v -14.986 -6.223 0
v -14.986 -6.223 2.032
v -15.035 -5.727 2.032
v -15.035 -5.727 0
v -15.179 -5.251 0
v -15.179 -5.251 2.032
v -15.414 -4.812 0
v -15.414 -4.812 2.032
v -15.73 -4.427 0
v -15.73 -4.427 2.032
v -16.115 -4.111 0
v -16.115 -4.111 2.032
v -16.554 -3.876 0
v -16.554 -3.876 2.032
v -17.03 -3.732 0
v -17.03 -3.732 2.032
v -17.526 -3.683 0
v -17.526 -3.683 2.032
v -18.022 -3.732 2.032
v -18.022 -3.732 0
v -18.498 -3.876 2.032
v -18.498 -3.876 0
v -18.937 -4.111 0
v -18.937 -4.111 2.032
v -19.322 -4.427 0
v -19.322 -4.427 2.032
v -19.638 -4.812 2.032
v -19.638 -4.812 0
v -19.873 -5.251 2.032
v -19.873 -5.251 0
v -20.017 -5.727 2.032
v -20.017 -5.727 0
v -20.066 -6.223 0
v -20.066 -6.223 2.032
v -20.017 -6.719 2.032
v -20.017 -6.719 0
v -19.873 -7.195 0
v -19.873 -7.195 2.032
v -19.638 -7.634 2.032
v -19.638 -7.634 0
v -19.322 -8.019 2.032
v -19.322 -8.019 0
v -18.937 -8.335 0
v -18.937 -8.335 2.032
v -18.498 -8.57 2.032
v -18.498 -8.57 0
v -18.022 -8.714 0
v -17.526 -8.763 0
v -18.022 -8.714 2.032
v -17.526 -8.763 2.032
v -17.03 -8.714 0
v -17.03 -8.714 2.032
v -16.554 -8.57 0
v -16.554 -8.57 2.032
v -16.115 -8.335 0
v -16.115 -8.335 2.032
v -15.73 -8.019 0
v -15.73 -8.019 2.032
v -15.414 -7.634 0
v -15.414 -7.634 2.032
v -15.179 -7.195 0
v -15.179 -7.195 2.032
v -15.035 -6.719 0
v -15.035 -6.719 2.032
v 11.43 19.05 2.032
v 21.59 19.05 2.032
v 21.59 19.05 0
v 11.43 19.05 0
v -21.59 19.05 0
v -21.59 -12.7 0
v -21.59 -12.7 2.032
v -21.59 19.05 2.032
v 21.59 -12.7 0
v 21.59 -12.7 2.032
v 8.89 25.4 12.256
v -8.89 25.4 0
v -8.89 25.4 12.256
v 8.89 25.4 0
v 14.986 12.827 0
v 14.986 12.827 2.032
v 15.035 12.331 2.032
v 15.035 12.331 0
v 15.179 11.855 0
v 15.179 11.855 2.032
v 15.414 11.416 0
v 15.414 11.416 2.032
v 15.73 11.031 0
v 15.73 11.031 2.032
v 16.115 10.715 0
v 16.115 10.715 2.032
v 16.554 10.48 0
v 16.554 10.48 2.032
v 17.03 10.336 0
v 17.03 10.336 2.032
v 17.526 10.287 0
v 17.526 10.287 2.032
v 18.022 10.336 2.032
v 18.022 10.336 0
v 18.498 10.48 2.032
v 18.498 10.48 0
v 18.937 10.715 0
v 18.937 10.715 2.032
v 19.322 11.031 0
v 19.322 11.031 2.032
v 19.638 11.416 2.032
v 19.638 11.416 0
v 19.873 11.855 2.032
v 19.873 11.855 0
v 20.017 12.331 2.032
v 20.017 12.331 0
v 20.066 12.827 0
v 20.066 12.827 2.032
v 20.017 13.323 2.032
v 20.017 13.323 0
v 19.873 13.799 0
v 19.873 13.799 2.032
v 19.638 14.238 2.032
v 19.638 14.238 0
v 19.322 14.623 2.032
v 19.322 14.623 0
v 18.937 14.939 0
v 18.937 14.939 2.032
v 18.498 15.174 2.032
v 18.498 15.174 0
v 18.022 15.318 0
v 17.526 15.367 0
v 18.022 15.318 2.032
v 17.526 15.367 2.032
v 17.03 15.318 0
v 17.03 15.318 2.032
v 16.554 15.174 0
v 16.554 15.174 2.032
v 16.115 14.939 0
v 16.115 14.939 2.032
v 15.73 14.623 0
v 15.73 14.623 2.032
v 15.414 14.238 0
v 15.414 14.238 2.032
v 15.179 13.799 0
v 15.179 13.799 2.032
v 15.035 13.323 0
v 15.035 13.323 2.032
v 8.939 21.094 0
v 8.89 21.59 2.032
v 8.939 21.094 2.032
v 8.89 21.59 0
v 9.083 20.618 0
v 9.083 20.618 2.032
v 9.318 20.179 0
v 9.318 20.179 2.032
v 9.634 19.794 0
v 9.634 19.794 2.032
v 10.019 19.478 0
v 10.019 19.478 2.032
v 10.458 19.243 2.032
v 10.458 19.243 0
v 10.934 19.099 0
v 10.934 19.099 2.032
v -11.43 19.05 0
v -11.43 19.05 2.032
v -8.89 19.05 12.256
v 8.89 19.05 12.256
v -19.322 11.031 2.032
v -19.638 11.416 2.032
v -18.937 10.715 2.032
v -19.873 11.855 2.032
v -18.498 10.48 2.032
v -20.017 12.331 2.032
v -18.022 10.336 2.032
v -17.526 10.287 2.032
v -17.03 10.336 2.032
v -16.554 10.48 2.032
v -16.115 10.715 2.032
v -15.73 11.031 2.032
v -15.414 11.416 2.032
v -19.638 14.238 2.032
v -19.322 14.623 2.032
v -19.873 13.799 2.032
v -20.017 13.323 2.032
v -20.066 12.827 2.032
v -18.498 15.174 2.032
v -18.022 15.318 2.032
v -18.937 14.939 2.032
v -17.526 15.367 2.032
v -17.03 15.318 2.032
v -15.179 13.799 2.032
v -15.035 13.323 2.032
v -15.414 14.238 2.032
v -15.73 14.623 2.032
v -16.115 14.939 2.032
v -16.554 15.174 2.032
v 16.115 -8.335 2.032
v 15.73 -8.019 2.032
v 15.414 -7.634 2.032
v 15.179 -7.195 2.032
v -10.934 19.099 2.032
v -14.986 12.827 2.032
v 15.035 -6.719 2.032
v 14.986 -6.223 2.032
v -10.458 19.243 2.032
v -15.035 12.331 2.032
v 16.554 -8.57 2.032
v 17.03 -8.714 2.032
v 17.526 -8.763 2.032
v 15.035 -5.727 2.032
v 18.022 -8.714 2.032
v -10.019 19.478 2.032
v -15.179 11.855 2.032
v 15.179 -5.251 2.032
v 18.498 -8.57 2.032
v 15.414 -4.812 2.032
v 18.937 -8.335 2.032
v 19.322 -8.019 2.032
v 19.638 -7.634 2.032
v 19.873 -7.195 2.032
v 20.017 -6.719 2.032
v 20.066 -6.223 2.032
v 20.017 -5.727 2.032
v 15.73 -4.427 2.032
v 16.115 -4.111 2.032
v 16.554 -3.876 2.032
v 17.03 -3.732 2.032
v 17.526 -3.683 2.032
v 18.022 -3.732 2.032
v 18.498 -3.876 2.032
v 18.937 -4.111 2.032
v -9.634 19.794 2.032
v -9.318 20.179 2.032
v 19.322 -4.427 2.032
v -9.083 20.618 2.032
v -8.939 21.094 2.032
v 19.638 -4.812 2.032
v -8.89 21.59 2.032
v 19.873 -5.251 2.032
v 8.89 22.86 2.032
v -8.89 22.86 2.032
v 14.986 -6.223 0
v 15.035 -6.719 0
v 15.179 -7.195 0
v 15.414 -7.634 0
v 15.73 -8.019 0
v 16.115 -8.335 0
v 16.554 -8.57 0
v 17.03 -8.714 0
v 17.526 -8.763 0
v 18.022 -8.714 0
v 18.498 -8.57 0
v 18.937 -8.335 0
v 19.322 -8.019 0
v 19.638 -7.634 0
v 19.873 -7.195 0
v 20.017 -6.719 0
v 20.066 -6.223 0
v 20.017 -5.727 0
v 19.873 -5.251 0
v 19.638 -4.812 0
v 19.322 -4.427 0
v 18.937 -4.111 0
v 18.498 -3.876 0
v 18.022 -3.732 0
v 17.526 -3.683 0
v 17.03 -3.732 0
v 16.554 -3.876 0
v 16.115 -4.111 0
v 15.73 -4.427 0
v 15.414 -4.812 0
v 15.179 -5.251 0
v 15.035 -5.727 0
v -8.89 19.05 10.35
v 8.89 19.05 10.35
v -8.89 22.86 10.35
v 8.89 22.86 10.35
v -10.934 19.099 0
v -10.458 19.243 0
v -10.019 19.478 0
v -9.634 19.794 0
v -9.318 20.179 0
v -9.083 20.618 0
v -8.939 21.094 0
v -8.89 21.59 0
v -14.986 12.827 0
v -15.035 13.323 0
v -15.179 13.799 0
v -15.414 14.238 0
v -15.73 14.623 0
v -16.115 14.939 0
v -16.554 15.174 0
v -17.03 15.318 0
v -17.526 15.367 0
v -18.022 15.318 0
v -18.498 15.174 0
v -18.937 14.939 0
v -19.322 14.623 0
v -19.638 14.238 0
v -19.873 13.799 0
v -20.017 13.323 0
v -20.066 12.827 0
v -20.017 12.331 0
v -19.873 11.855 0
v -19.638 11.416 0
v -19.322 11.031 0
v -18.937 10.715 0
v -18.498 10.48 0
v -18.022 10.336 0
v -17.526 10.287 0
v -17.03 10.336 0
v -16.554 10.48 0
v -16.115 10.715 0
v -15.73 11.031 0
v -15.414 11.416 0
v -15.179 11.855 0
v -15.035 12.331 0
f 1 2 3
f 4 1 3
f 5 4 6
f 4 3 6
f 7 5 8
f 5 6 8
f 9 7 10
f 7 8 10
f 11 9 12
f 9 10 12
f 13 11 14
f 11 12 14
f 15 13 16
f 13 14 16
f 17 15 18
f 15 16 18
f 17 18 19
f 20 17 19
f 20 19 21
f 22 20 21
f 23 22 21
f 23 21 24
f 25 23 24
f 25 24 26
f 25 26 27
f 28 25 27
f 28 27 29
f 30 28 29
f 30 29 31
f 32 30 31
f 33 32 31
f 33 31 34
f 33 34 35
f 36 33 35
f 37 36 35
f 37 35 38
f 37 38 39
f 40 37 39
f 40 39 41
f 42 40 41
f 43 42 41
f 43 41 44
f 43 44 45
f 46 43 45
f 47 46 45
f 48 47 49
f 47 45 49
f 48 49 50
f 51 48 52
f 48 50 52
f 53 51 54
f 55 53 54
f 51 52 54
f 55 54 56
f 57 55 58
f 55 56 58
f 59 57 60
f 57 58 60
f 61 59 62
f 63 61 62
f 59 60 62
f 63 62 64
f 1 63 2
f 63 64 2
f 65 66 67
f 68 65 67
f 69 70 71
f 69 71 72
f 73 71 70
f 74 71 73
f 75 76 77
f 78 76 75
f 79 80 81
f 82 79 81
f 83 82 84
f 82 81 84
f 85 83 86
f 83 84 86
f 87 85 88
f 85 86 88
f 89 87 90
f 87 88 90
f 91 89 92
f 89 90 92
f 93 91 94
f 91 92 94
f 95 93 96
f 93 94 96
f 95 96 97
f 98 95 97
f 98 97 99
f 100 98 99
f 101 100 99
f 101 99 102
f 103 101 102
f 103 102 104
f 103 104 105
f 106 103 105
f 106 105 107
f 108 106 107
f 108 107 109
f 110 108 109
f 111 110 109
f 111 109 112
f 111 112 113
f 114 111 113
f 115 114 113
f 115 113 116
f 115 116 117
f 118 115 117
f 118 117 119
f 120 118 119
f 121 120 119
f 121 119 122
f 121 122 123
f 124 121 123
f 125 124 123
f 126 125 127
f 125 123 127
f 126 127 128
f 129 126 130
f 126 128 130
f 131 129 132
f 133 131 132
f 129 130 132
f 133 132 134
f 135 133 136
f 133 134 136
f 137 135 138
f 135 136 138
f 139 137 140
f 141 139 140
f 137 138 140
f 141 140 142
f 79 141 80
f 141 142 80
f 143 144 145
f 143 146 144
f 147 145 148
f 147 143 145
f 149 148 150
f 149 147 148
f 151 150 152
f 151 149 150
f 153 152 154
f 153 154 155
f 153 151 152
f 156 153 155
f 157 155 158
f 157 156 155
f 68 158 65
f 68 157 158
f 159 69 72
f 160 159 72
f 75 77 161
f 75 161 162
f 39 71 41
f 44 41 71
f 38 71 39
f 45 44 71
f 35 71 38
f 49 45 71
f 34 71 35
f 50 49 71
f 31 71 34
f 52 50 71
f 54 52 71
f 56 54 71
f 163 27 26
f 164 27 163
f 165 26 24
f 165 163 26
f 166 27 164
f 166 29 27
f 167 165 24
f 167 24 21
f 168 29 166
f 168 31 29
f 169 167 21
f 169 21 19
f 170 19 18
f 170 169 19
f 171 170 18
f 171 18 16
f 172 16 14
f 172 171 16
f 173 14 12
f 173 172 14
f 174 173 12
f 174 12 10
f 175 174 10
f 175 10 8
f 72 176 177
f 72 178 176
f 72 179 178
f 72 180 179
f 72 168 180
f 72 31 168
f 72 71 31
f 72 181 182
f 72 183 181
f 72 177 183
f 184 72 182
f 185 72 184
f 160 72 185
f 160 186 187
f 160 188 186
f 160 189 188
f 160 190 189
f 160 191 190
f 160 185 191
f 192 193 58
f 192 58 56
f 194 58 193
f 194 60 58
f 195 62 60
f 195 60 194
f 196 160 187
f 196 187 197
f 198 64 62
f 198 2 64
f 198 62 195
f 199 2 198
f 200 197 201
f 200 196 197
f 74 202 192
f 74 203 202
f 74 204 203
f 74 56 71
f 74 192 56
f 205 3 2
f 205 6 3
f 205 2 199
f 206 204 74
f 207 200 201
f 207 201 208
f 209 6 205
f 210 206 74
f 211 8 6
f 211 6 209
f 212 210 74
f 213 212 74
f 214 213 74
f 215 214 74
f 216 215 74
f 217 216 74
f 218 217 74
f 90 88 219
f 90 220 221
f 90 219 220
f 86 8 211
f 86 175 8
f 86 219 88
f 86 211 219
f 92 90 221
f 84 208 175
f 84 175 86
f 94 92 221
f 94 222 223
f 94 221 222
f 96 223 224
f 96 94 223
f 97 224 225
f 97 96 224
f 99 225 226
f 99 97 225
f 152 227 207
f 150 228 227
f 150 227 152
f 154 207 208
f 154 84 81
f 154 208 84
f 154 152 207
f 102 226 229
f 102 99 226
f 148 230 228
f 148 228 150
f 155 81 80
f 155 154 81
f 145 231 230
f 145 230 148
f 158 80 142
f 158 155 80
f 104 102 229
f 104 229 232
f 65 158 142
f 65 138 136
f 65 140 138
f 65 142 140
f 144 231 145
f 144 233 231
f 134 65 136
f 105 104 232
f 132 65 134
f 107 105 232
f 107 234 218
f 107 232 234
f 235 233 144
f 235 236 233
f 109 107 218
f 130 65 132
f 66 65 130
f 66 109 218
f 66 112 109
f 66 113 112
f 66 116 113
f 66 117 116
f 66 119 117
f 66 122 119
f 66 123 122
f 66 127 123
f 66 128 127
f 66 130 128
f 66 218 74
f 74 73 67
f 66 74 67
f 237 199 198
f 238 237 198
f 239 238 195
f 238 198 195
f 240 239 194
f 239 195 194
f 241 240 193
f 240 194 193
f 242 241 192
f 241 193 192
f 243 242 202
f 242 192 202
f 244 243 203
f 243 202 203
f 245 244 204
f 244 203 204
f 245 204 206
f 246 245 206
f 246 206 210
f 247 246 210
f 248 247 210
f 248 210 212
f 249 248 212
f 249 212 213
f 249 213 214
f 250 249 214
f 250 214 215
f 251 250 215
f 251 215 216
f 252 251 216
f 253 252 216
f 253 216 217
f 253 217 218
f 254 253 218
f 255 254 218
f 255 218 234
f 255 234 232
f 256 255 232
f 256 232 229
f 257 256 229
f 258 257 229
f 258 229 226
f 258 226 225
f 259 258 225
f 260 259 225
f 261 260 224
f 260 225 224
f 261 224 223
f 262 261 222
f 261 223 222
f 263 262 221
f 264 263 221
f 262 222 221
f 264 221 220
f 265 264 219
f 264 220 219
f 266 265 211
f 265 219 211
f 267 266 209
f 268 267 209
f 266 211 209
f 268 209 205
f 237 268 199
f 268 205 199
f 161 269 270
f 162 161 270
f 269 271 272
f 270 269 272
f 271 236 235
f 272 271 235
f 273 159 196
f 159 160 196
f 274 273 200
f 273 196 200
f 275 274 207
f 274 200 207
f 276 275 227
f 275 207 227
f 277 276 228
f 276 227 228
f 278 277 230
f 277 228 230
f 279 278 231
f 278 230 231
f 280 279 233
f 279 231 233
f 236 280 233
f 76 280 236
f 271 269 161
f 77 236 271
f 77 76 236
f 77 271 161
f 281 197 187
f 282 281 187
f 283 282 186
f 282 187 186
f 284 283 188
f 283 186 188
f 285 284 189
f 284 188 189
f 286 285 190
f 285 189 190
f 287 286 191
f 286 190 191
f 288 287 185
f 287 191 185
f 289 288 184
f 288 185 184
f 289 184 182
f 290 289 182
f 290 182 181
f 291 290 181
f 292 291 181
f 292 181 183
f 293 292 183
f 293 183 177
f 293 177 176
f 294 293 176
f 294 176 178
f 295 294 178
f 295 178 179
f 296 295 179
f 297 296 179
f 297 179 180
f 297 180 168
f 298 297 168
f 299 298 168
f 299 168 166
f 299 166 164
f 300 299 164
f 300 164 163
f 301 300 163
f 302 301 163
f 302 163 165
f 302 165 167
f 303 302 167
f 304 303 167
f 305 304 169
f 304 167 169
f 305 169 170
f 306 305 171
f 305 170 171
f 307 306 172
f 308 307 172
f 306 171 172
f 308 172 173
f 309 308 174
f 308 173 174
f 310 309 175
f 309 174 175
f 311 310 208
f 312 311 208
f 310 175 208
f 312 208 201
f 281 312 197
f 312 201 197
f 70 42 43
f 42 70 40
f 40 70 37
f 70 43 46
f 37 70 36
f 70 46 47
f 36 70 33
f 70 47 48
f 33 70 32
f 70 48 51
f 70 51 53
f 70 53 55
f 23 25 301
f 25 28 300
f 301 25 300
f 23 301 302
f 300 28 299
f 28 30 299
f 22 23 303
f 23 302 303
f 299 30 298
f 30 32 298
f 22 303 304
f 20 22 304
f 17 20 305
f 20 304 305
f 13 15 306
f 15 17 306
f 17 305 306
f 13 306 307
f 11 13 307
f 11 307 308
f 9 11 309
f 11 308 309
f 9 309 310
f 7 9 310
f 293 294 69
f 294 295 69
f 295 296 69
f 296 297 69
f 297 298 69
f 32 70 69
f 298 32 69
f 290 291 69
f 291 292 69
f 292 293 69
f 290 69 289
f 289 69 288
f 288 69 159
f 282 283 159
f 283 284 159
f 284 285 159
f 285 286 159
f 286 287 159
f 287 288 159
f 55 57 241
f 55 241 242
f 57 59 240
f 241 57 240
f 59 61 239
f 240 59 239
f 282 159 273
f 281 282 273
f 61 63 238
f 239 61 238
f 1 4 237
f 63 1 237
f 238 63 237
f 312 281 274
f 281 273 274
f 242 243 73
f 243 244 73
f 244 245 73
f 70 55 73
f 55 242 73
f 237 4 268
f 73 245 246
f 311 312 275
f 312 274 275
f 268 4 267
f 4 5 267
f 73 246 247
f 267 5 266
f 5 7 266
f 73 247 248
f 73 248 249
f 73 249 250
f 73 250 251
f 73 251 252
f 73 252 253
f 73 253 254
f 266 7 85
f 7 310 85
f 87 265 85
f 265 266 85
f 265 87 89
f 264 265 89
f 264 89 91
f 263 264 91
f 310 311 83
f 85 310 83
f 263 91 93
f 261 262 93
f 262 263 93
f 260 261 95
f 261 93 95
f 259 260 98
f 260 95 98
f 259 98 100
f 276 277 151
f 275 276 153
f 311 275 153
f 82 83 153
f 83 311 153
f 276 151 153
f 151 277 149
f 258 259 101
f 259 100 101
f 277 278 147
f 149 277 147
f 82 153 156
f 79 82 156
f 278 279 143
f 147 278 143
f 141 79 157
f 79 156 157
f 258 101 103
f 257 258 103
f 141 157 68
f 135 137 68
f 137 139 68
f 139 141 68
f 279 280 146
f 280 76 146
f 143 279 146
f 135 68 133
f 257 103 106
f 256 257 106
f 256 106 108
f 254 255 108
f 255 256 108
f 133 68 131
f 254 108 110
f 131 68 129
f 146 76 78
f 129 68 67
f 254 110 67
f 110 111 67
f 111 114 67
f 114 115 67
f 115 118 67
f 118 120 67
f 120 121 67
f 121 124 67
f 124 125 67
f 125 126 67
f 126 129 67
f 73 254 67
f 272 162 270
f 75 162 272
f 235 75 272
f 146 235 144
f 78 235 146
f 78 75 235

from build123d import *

# Parameters (mm, degrees)
SKETCH1_W           = 43.18
SKETCH1_H           = 50.8
BOSS_EXTRUDE1_DEPTH = 2.032
SKETCH2_R           = 2.54
CUT_EXTRUDE1_DEPTH  = 34.397861069
SKETCH3_W           = 43.18
SKETCH3_H           = 2.54
BOSS_EXTRUDE2_DEPTH = 8.3185
SKETCH4_W           = 43.18
SKETCH4_H           = 6.35
BOSS_EXTRUDE3_DEPTH = 1.905
SKETCH5_W           = 12.2555
SKETCH5_H           = 6.35
CUT_EXTRUDE2_DEPTH  = 12.7
SKETCH6_W           = 12.2555
SKETCH6_H           = 6.35
CUT_EXTRUDE3_DEPTH  = 12.7
FILLET1_R           = 2.54
SKETCH7_W           = 43.18
SKETCH7_H           = 12.7
CUT_EXTRUDE4_DEPTH  = 12.7


with BuildPart() as part:
    # Sketch1 → Boss-Extrude1 (new body)
    with BuildSketch(Plane.XY):
        Rectangle(SKETCH1_W, SKETCH1_H)
    extrude(amount=BOSS_EXTRUDE1_DEPTH)

    # Sketch2 → Cut-Extrude1 (cut, through all)
    with BuildSketch(Plane.XY.offset(2.032)):
        with Locations((-17.526, 12.827)):
            Circle(SKETCH2_R)
        with Locations((-17.526, -6.223)):
            Circle(SKETCH2_R)
        with Locations(Location((17.526, -6.223, 0), (0, 0, 180))):
            Circle(SKETCH2_R)
        with Locations(Location((17.526, 12.827, 0), (0, 0, 180))):
            Circle(SKETCH2_R)
    extrude(amount=-CUT_EXTRUDE1_DEPTH, mode=Mode.SUBTRACT)

    # Sketch3 → Boss-Extrude2 (add)
    with BuildSketch(Plane.XY.offset(2.032)):
        with Locations((0, 24.13)):
            Rectangle(SKETCH3_W, SKETCH3_H)
    extrude(amount=BOSS_EXTRUDE2_DEPTH)

    # Sketch4 → Boss-Extrude3 (add)
    with BuildSketch(Plane.XY.offset(10.3505)):
        with Locations((0, 22.225)):
            Rectangle(SKETCH4_W, SKETCH4_H)
    extrude(amount=BOSS_EXTRUDE3_DEPTH)

    # Sketch5 → Cut-Extrude2 (cut)
    with BuildSketch(Plane(origin=(21.59, 0, 0), x_dir=(0, 0, -1), z_dir=(1, 0, 0))):
        with Locations((-6.12775, 22.225)):
            Rectangle(SKETCH5_W, SKETCH5_H)
    extrude(amount=-CUT_EXTRUDE2_DEPTH, mode=Mode.SUBTRACT)

    # Sketch6 → Cut-Extrude3 (cut)
    with BuildSketch(Plane.ZY.offset(21.59)):
        with Locations((6.12775, 22.225)):
            Rectangle(SKETCH6_W, SKETCH6_H)
    extrude(amount=-CUT_EXTRUDE3_DEPTH, mode=Mode.SUBTRACT)

    # Fillet1
    fillet1_edges = [part.edges().sort_by_distance(p)[0] for p in [
        (8.89, 19.05, 1.016),
        (-8.89, 19.05, 1.016),
    ]]
    fillet(fillet1_edges, radius=FILLET1_R)

    # Sketch7 → Cut-Extrude4 (cut)
    with BuildSketch(Plane.XY.offset(2.032)):
        with Locations((0, -19.05)):
            Rectangle(SKETCH7_W, SKETCH7_H)
    extrude(amount=-CUT_EXTRUDE4_DEPTH, mode=Mode.SUBTRACT)


solid = part.part
